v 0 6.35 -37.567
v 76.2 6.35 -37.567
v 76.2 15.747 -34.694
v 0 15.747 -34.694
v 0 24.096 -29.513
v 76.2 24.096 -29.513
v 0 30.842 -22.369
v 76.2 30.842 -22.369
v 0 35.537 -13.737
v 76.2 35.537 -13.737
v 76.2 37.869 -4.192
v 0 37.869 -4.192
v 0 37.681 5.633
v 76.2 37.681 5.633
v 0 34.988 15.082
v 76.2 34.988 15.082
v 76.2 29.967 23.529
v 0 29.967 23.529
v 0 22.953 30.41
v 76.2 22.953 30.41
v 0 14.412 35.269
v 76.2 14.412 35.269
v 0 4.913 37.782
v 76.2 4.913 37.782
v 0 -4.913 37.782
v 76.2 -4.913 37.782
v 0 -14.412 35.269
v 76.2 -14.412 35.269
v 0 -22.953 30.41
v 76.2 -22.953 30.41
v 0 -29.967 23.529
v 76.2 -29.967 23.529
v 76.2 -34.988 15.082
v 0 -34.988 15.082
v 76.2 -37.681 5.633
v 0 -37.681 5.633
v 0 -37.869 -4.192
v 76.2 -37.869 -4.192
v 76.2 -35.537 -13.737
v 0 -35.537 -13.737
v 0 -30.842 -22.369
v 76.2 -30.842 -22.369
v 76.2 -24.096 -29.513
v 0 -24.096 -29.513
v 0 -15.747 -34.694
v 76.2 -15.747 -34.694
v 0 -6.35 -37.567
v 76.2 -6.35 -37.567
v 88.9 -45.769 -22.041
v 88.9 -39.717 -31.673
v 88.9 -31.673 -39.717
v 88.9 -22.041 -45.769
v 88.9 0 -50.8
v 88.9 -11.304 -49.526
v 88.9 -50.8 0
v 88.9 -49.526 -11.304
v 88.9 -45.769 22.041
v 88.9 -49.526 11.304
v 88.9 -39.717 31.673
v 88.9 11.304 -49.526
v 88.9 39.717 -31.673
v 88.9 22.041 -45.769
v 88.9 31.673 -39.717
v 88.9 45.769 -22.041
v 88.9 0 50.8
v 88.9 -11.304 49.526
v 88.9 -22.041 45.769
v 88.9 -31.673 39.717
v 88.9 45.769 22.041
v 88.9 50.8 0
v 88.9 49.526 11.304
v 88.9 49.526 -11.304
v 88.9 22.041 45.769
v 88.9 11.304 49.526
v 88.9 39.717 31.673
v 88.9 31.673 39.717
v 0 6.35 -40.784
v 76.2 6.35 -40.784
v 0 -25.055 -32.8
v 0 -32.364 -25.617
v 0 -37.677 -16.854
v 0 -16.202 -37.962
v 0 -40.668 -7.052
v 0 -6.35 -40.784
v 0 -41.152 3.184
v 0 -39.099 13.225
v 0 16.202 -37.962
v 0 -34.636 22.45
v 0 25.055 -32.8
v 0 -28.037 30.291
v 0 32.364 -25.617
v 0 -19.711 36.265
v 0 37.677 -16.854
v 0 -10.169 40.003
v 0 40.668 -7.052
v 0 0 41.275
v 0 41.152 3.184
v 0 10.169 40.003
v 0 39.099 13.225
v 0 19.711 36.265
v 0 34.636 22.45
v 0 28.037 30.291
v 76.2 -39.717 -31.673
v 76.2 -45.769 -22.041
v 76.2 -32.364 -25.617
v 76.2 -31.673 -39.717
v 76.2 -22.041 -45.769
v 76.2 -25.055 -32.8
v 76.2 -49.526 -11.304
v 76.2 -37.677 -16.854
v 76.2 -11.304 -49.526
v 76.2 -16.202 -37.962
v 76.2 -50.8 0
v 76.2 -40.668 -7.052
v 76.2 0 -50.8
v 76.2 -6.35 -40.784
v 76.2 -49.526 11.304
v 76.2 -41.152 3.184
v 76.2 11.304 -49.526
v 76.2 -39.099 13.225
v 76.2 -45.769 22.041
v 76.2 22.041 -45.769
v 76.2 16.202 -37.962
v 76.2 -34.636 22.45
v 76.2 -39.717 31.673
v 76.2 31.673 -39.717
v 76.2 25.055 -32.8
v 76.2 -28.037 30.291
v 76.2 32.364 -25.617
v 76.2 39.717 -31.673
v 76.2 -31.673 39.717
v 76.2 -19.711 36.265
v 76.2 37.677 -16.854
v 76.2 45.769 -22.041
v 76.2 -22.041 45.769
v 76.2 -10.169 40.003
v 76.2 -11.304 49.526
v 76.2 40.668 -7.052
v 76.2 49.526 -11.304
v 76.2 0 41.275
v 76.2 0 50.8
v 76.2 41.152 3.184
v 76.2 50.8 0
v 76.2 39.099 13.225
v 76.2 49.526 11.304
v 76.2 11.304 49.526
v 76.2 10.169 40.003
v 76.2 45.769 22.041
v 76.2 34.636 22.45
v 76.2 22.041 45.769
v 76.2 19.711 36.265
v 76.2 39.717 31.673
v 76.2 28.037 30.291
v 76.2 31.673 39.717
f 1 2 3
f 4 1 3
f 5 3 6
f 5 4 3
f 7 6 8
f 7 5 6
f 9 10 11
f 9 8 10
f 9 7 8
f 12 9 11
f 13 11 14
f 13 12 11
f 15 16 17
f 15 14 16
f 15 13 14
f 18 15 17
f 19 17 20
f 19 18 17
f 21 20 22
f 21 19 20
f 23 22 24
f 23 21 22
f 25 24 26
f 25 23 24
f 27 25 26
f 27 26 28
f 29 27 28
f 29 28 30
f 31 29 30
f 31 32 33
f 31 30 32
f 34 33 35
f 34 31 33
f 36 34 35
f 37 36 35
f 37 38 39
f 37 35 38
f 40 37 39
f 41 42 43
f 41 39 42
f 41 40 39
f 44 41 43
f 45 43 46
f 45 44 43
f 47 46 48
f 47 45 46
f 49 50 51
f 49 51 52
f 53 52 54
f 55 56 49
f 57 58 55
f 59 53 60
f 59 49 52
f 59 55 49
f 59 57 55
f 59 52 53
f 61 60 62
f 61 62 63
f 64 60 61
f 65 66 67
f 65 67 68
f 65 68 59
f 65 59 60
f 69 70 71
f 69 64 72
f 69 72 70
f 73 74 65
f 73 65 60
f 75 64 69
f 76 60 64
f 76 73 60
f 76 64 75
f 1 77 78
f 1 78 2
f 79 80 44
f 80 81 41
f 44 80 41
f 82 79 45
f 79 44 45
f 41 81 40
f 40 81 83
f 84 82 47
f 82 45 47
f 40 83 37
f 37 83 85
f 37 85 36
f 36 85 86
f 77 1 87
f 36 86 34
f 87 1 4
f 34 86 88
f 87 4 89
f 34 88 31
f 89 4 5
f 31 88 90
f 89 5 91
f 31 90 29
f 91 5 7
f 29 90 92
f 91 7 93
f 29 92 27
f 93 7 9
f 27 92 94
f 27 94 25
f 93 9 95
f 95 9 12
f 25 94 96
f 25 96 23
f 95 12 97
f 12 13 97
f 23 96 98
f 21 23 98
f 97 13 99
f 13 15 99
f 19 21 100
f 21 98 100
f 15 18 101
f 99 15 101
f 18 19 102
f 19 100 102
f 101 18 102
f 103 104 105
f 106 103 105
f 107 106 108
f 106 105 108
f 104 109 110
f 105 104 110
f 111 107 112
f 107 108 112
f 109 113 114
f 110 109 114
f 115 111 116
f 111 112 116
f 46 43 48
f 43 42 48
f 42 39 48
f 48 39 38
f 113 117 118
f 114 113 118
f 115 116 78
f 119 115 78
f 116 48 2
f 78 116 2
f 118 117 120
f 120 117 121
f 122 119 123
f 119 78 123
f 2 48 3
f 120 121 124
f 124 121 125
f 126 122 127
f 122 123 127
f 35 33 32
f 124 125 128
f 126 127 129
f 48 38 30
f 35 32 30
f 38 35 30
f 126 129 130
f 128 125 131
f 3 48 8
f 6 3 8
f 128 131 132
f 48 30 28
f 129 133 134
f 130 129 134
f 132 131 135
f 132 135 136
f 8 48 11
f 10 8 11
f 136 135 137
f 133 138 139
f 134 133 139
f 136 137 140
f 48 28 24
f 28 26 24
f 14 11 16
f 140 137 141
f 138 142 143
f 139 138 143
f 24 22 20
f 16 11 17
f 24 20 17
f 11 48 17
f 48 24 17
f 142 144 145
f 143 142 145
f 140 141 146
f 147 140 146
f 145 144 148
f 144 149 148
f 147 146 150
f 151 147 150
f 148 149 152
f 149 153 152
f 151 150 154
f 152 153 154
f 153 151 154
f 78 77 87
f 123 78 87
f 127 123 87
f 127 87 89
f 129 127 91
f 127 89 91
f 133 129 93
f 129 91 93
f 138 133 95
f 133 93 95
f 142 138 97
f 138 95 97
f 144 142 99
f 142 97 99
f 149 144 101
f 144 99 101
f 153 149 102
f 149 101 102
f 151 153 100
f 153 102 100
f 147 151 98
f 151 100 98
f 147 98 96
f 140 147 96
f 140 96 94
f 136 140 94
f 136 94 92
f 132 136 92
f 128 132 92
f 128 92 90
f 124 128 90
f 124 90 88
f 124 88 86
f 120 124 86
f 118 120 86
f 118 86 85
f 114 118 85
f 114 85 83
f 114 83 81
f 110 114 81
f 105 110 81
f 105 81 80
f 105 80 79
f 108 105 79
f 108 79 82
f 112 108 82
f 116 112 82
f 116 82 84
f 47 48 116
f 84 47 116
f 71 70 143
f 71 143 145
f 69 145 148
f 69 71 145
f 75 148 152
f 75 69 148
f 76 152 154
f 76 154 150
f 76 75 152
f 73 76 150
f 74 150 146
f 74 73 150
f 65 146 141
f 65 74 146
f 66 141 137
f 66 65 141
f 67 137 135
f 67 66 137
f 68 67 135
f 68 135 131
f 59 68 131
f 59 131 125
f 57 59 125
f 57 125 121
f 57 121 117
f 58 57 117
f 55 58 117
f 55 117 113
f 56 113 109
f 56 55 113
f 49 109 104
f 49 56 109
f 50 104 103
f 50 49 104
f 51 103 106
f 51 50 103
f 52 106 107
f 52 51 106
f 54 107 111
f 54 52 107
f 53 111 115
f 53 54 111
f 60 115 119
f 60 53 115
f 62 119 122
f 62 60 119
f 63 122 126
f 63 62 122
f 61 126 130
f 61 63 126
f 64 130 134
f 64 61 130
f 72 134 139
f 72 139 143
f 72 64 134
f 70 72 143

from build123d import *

# Parameters (mm, degrees)
F0_R     = 41.275
F1_DEPTH = 88.9
F2_R     = 50.8
F2_R_2   = 41.275
F3_DEPTH = 12.7
F5_DEPTH = 76.2
F6_R     = 38.1
F7_DEPTH = 76.2


with BuildPart() as f1:
    # F0 (on Right) → F1 (new body)
    with BuildSketch(Plane.YZ):
        Circle(F0_R)
    extrude(amount=F1_DEPTH)

    # F2 (on face) → F3 (join)
    with BuildSketch(Plane.YZ.offset(88.9)):
        Circle(F2_R)
        Circle(F2_R_2, mode=Mode.SUBTRACT)
    extrude(amount=-F3_DEPTH)

    # F4 (on face) → F5 (cut)
    with BuildSketch(Plane.YZ):
        with BuildLine():
            Line((6.35, -21.4923172526), (-6.35, -21.4923172526))
            Line((-6.35, -21.4923172526), (-6.35, -40.7836134373))
            ThreePointArc((-6.35, -40.7836134373), (0, -41.275), (6.35, -40.7836134373))
            Line((6.35, -40.7836134373), (6.35, -21.4923172526))
        make_face()
    extrude(amount=F5_DEPTH, mode=Mode.SUBTRACT)

    # F6 (on face) → F7 (cut)
    with BuildSketch(Plane.YZ):
        Circle(F6_R)
    extrude(amount=F7_DEPTH, mode=Mode.SUBTRACT)


solid = f1.part
